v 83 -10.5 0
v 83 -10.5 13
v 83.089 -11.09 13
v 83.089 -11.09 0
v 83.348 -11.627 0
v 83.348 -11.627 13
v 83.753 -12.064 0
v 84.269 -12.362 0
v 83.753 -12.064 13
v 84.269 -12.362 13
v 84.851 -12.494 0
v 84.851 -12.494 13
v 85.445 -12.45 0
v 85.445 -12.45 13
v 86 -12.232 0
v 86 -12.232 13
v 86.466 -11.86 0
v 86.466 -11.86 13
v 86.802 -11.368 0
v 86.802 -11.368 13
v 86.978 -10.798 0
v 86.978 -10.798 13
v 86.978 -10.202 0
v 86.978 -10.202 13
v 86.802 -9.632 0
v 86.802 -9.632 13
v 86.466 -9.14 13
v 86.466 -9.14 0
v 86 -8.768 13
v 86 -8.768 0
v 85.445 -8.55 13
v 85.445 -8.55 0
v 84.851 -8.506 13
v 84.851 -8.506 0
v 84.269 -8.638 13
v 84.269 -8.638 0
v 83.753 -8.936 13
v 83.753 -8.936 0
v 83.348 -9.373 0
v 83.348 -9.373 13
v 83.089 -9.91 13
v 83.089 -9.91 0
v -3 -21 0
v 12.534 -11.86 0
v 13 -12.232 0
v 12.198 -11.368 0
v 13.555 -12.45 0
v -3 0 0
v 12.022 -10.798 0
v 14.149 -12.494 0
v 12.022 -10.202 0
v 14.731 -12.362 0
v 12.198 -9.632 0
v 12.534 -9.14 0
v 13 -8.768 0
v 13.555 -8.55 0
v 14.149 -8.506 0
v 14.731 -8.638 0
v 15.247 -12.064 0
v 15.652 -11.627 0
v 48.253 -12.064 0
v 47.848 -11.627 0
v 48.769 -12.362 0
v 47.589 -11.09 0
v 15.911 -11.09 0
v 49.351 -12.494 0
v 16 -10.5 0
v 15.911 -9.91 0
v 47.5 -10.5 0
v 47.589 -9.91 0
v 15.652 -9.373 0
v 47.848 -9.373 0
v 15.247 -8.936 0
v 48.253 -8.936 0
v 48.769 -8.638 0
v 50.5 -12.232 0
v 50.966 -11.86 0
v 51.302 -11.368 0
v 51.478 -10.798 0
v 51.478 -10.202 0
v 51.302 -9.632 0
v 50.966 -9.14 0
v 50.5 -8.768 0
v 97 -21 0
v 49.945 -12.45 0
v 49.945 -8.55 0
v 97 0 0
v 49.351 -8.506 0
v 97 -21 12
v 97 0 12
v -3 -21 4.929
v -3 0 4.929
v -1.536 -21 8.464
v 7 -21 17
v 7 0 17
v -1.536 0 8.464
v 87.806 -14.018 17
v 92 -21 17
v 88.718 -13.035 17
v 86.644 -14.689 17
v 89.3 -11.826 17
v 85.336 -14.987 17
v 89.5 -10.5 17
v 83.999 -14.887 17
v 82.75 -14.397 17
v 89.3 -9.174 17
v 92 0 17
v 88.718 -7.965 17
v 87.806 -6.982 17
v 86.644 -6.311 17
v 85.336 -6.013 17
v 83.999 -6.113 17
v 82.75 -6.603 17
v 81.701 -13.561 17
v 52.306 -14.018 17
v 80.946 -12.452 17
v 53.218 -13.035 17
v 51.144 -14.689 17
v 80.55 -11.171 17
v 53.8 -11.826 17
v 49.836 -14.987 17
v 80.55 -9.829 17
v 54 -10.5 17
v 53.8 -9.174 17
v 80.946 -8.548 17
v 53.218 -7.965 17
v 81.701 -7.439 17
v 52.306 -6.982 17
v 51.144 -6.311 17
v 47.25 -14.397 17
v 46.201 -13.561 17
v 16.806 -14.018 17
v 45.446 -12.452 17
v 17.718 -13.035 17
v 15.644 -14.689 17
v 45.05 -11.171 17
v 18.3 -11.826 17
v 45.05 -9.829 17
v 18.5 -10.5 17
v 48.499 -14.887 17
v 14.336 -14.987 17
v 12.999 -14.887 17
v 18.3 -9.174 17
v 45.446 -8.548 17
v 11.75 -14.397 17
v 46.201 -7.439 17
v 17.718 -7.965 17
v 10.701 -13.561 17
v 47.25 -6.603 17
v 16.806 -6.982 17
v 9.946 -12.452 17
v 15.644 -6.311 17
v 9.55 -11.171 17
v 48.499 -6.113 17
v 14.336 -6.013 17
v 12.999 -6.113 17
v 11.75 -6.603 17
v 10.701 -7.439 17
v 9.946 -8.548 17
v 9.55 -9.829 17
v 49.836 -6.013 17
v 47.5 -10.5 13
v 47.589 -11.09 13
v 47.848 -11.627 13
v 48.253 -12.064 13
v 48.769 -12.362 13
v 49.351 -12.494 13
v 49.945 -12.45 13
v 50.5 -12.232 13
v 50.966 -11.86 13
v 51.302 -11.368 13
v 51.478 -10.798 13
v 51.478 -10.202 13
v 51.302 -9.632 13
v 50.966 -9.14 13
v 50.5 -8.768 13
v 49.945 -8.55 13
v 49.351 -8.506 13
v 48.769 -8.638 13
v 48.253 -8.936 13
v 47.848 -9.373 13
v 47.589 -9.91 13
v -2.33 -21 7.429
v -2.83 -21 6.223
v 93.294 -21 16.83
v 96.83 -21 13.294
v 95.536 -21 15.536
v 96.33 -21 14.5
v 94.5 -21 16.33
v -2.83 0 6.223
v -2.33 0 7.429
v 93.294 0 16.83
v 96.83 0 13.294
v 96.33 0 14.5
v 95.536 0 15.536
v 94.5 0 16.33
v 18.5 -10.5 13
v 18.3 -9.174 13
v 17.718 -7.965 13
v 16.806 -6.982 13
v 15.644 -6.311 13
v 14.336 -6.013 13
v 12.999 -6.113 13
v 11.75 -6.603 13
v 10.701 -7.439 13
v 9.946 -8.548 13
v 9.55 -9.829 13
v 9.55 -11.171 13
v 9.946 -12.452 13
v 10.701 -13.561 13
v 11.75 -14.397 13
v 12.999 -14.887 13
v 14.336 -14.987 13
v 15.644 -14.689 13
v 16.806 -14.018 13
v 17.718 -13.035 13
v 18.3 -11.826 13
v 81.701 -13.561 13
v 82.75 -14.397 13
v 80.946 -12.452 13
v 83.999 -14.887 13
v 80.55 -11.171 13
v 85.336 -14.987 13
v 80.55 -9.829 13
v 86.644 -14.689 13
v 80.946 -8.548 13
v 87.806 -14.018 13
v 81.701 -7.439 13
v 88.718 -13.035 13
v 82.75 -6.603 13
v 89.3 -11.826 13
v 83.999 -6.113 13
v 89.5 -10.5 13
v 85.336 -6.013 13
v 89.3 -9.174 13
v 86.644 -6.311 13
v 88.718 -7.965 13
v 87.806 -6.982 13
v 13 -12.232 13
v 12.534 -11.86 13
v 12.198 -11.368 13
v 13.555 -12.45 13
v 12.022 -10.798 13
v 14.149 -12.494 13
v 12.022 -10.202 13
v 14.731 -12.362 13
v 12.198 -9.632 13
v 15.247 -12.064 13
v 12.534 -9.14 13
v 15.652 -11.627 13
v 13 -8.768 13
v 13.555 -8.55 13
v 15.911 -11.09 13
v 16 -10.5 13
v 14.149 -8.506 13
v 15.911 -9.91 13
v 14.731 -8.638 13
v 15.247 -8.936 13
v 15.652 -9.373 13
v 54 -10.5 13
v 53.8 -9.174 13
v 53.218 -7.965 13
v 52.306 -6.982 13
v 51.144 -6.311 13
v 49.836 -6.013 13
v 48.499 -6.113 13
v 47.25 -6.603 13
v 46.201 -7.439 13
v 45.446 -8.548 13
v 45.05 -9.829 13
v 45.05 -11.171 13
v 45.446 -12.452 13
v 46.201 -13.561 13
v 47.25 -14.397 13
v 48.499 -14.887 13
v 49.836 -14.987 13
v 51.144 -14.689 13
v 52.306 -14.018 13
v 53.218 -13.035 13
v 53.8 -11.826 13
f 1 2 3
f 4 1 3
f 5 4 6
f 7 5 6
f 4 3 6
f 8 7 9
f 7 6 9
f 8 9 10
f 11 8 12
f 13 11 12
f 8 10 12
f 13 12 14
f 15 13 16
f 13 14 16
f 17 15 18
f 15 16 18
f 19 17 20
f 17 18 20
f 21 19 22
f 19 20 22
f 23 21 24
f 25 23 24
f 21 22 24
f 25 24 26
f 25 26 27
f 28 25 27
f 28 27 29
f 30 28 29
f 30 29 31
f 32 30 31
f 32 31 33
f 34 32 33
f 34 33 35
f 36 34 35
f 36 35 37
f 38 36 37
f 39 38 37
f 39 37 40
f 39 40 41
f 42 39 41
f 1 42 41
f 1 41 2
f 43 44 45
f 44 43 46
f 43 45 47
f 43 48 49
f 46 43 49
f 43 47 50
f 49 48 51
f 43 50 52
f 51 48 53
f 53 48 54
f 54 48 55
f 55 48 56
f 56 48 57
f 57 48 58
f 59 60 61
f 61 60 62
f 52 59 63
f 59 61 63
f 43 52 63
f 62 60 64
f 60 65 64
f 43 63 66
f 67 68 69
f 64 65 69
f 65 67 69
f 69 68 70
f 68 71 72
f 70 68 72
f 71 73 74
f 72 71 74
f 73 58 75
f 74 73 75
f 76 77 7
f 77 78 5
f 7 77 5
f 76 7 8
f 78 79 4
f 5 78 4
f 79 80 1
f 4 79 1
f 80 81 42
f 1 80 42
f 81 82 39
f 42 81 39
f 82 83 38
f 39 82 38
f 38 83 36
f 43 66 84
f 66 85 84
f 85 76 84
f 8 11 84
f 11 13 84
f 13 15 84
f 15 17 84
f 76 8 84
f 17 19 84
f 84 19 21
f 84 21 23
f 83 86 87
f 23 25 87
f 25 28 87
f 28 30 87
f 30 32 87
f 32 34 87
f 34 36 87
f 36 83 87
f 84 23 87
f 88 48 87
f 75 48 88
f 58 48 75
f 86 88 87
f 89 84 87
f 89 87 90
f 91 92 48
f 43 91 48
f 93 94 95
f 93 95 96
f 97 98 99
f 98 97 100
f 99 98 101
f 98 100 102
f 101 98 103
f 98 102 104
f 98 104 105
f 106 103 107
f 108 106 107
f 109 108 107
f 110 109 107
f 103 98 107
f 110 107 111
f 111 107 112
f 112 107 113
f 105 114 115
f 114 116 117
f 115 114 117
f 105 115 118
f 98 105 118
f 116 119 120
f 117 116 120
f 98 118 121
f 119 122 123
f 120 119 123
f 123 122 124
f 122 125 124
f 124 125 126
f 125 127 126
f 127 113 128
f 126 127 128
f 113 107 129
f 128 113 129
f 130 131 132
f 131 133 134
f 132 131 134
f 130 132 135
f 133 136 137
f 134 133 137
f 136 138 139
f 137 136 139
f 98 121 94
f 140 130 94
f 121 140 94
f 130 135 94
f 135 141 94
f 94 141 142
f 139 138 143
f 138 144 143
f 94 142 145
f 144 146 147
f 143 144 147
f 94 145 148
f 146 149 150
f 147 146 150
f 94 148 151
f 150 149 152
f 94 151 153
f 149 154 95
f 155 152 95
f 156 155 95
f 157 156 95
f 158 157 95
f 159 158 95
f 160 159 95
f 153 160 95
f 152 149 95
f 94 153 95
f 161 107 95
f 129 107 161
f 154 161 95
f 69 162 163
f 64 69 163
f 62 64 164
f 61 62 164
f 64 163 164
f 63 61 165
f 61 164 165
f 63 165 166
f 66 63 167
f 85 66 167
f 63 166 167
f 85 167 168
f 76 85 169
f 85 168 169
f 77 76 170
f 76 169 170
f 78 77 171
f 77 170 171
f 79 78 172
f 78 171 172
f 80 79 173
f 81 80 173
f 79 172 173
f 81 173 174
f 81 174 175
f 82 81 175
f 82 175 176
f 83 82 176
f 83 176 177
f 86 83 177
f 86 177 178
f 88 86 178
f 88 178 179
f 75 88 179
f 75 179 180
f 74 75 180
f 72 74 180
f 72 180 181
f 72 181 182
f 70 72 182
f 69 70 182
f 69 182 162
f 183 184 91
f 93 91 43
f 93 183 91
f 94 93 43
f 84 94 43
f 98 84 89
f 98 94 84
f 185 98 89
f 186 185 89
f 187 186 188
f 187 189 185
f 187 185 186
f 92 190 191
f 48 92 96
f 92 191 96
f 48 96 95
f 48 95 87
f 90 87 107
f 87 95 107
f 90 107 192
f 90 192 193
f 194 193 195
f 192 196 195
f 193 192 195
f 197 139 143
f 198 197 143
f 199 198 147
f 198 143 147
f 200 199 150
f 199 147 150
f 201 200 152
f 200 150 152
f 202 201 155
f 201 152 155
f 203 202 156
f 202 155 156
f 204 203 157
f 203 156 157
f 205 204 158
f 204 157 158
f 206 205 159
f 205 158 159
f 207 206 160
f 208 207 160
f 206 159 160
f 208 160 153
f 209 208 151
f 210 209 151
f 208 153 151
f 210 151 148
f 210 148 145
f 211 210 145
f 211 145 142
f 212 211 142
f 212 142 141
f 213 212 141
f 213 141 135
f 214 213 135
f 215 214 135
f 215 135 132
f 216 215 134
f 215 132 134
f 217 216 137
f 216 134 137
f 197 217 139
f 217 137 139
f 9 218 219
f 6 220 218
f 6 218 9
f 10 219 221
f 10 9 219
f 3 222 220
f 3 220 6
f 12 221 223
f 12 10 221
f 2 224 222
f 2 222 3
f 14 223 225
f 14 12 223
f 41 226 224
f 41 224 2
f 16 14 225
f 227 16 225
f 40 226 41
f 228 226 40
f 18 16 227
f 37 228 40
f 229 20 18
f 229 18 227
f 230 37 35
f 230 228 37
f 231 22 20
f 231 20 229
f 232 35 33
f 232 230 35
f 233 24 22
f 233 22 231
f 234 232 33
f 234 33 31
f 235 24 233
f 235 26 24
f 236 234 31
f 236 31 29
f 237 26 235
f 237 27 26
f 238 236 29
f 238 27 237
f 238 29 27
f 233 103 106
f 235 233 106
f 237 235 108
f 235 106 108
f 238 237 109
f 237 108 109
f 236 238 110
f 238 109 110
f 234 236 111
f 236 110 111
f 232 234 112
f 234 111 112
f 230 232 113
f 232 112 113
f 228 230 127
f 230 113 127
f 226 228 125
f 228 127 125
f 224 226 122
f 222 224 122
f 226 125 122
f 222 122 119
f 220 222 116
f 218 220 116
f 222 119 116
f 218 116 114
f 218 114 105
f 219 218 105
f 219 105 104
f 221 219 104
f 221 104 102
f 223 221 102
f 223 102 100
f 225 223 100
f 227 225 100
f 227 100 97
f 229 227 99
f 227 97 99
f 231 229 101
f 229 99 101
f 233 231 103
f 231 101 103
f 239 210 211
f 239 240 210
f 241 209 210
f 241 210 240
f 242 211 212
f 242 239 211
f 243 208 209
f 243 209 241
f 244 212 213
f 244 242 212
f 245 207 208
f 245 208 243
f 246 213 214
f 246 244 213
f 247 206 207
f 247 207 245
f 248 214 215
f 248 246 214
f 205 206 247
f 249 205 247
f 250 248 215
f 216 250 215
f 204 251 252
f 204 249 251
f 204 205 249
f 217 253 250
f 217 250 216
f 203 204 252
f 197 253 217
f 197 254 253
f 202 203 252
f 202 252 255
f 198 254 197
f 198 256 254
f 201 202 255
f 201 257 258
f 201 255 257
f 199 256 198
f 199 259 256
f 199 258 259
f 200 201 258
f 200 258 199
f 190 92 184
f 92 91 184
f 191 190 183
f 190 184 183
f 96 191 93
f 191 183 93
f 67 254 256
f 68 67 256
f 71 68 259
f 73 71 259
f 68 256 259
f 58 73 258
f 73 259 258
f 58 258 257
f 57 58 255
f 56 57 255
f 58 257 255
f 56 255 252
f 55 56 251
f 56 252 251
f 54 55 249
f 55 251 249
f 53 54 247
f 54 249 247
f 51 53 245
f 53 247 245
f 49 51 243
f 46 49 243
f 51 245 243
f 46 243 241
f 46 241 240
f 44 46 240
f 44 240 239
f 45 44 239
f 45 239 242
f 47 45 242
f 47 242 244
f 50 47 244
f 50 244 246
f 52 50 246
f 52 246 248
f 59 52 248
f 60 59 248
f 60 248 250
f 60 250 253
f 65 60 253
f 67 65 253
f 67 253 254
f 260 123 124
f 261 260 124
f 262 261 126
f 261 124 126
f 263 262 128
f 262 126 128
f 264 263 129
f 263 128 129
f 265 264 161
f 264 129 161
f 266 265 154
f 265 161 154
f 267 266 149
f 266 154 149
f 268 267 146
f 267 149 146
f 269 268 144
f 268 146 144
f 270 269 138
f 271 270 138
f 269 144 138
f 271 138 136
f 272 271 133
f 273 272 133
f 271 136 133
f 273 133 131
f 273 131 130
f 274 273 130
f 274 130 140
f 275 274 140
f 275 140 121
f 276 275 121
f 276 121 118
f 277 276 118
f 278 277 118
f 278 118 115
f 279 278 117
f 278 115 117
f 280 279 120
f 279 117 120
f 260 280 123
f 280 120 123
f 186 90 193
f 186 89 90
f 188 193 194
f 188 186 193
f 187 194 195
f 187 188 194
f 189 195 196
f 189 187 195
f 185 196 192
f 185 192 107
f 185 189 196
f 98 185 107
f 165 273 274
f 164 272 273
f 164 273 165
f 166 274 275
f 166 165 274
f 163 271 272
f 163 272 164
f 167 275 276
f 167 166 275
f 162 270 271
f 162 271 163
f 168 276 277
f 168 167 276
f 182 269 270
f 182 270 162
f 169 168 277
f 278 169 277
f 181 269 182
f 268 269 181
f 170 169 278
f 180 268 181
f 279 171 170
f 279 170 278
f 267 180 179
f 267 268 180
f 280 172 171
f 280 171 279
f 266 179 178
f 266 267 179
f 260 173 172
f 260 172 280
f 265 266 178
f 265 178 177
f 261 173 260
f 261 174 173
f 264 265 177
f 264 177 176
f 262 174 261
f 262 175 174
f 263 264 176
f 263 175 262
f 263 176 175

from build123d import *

# Parameters (mm, degrees)
F1_DEPTH = 21
F2_R     = 5
F3_R     = 5
F5_DEPTH = 25
F6_R     = 4.5
F7_DEPTH = 4


with BuildPart() as f1:
    # F0 (on Front) → F1 (new body)
    with BuildSketch(Plane.XZ):
        Polygon((-3, 7), (-3, 0), (97, 0), (97, 17), (7, 17), align=None)
    extrude(amount=F1_DEPTH)

    # F2
    f2_edges = [f1.edges().sort_by_distance(p)[0] for p in [
        (97, -10.5, 17),
    ]]
    fillet(f2_edges, radius=F2_R)

    # F3
    f3_edges = [f1.edges().sort_by_distance(p)[0] for p in [
        (-3, -10.5, 7),
    ]]
    fillet(f3_edges, radius=F3_R)

    # F4 (on face) → F5 (cut)
    with BuildSketch(Plane.XY.offset(17)):
        with BuildLine():
            ThreePointArc((87, -10.5), (85, -8.5), (83, -10.5))
            Line((83, -10.5), (87, -10.5))
        make_face()
        with BuildLine():
            Line((87, -10.5), (83, -10.5))
            ThreePointArc((83, -10.5), (85, -12.5), (87, -10.5))
        make_face()
        with BuildLine():
            ThreePointArc((51.5, -10.5), (49.5, -8.5), (47.5, -10.5))
            Line((47.5, -10.5), (51.5, -10.5))
        make_face()
        with BuildLine():
            Line((51.5, -10.5), (47.5, -10.5))
            ThreePointArc((47.5, -10.5), (49.5, -12.5), (51.5, -10.5))
        make_face()
        with BuildLine():
            ThreePointArc((12, -10.5), (14, -12.5), (16, -10.5))
            Line((16, -10.5), (12, -10.5))
        make_face()
        with BuildLine():
            Line((12, -10.5), (16, -10.5))
            ThreePointArc((16, -10.5), (14, -8.5), (12, -10.5))
        make_face()
    extrude(amount=-F5_DEPTH, mode=Mode.SUBTRACT)

    # F6 (on face) → F7 (cut)
    with BuildSketch(Plane.XY.offset(17)):
        with Locations((14, -10.5)):
            Circle(F6_R)
        with Locations((49.5, -10.5)):
            Circle(F6_R)
        with Locations((85, -10.5)):
            Circle(F6_R)
    extrude(amount=-F7_DEPTH, mode=Mode.SUBTRACT)


solid = f1.part
